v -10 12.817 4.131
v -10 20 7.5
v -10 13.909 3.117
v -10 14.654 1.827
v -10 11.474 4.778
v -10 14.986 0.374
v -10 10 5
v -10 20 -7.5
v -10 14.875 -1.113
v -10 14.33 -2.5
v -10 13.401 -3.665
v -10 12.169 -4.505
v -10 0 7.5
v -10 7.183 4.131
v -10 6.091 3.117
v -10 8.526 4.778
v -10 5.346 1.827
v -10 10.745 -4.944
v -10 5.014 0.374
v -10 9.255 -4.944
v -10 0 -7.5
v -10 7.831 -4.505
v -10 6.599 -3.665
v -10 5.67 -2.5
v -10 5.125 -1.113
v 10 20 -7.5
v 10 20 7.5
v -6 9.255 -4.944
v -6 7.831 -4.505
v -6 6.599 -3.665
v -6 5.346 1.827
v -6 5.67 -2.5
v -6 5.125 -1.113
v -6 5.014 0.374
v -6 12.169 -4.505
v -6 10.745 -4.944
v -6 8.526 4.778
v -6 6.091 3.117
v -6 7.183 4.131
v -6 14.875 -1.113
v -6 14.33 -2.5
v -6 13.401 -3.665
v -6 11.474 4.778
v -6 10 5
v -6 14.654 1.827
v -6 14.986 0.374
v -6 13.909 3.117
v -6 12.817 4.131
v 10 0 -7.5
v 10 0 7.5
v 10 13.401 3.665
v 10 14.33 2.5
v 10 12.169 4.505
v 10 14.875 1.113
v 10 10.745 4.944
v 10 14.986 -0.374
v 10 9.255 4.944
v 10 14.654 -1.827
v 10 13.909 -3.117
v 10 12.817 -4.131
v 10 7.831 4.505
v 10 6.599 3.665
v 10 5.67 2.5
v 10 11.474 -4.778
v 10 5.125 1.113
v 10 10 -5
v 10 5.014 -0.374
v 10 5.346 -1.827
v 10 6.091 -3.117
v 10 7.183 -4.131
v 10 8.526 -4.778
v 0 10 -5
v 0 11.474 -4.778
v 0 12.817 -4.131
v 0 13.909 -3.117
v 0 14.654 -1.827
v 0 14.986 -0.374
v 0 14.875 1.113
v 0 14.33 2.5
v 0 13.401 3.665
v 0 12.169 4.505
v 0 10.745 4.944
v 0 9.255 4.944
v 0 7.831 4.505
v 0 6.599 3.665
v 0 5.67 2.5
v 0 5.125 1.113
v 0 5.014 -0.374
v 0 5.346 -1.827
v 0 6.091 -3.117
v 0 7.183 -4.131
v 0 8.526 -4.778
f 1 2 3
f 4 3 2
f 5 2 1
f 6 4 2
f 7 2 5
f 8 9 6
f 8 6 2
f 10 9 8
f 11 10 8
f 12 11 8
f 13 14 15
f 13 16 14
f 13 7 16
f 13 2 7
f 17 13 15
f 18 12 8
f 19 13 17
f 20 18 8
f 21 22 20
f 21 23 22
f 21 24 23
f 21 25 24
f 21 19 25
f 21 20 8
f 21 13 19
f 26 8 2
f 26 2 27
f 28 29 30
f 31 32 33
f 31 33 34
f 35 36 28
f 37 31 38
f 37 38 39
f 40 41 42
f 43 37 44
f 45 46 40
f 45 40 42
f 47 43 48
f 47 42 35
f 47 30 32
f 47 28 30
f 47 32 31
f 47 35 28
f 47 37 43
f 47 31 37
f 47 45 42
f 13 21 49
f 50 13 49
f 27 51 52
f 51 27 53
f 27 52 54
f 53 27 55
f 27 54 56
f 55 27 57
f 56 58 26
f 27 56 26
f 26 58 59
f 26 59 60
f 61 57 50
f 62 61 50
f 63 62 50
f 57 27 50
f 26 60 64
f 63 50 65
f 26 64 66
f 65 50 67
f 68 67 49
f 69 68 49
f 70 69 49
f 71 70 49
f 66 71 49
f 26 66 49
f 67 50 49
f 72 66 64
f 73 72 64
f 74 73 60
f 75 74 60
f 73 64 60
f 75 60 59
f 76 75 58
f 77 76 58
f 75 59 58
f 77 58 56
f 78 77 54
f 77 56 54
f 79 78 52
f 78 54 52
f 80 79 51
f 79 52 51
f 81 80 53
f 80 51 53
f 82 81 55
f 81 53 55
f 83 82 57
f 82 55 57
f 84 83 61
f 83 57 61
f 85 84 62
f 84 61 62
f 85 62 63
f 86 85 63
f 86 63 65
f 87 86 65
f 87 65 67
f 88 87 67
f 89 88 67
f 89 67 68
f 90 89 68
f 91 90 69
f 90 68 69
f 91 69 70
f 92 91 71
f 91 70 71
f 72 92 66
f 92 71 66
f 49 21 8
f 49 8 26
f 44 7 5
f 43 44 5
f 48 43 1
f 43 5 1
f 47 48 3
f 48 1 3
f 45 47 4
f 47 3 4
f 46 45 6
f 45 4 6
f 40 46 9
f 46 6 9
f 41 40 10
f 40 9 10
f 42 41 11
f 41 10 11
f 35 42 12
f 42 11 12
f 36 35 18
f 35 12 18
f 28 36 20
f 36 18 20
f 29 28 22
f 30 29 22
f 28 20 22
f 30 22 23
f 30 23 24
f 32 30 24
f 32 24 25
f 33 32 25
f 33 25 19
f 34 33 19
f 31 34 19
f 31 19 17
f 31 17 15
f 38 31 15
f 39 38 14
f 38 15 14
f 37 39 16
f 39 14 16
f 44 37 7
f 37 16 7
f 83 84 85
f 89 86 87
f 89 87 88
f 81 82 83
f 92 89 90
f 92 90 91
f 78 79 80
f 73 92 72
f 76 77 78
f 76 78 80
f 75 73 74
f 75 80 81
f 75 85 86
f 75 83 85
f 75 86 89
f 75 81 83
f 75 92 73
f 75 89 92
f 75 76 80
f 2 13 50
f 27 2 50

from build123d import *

# Parameters (mm, degrees)
SKETCH3_W           = 20
SKETCH3_H           = 15
BOSS_EXTRUDE1_DEPTH = 20
SKETCH5_R           = 5
CUT_EXTRUDE1_DEPTH  = 10
SKETCH6_R           = 5
CUT_EXTRUDE2_DEPTH  = 4


with BuildPart() as part:
    # Sketch3 → Boss-Extrude1 (new body)
    with BuildSketch(Plane(origin=(0, 0, 0), x_dir=(1, 0, 0), z_dir=(0, 1, 0))):
        Rectangle(SKETCH3_W, SKETCH3_H)
    extrude(amount=BOSS_EXTRUDE1_DEPTH)

    # Sketch5 → Cut-Extrude1 (cut)
    with BuildSketch(Plane(origin=(10, 0, 0), x_dir=(0, 0, -1), z_dir=(1, 0, 0))):
        with Locations((0, 10)):
            Circle(SKETCH5_R)
    extrude(amount=-CUT_EXTRUDE1_DEPTH, mode=Mode.SUBTRACT)

    # Sketch6 → Cut-Extrude2 (cut)
    with BuildSketch(Plane.ZY.offset(10)):
        with Locations((0, 10)):
            Circle(SKETCH6_R)
    extrude(amount=-CUT_EXTRUDE2_DEPTH, mode=Mode.SUBTRACT)


solid = part.part
